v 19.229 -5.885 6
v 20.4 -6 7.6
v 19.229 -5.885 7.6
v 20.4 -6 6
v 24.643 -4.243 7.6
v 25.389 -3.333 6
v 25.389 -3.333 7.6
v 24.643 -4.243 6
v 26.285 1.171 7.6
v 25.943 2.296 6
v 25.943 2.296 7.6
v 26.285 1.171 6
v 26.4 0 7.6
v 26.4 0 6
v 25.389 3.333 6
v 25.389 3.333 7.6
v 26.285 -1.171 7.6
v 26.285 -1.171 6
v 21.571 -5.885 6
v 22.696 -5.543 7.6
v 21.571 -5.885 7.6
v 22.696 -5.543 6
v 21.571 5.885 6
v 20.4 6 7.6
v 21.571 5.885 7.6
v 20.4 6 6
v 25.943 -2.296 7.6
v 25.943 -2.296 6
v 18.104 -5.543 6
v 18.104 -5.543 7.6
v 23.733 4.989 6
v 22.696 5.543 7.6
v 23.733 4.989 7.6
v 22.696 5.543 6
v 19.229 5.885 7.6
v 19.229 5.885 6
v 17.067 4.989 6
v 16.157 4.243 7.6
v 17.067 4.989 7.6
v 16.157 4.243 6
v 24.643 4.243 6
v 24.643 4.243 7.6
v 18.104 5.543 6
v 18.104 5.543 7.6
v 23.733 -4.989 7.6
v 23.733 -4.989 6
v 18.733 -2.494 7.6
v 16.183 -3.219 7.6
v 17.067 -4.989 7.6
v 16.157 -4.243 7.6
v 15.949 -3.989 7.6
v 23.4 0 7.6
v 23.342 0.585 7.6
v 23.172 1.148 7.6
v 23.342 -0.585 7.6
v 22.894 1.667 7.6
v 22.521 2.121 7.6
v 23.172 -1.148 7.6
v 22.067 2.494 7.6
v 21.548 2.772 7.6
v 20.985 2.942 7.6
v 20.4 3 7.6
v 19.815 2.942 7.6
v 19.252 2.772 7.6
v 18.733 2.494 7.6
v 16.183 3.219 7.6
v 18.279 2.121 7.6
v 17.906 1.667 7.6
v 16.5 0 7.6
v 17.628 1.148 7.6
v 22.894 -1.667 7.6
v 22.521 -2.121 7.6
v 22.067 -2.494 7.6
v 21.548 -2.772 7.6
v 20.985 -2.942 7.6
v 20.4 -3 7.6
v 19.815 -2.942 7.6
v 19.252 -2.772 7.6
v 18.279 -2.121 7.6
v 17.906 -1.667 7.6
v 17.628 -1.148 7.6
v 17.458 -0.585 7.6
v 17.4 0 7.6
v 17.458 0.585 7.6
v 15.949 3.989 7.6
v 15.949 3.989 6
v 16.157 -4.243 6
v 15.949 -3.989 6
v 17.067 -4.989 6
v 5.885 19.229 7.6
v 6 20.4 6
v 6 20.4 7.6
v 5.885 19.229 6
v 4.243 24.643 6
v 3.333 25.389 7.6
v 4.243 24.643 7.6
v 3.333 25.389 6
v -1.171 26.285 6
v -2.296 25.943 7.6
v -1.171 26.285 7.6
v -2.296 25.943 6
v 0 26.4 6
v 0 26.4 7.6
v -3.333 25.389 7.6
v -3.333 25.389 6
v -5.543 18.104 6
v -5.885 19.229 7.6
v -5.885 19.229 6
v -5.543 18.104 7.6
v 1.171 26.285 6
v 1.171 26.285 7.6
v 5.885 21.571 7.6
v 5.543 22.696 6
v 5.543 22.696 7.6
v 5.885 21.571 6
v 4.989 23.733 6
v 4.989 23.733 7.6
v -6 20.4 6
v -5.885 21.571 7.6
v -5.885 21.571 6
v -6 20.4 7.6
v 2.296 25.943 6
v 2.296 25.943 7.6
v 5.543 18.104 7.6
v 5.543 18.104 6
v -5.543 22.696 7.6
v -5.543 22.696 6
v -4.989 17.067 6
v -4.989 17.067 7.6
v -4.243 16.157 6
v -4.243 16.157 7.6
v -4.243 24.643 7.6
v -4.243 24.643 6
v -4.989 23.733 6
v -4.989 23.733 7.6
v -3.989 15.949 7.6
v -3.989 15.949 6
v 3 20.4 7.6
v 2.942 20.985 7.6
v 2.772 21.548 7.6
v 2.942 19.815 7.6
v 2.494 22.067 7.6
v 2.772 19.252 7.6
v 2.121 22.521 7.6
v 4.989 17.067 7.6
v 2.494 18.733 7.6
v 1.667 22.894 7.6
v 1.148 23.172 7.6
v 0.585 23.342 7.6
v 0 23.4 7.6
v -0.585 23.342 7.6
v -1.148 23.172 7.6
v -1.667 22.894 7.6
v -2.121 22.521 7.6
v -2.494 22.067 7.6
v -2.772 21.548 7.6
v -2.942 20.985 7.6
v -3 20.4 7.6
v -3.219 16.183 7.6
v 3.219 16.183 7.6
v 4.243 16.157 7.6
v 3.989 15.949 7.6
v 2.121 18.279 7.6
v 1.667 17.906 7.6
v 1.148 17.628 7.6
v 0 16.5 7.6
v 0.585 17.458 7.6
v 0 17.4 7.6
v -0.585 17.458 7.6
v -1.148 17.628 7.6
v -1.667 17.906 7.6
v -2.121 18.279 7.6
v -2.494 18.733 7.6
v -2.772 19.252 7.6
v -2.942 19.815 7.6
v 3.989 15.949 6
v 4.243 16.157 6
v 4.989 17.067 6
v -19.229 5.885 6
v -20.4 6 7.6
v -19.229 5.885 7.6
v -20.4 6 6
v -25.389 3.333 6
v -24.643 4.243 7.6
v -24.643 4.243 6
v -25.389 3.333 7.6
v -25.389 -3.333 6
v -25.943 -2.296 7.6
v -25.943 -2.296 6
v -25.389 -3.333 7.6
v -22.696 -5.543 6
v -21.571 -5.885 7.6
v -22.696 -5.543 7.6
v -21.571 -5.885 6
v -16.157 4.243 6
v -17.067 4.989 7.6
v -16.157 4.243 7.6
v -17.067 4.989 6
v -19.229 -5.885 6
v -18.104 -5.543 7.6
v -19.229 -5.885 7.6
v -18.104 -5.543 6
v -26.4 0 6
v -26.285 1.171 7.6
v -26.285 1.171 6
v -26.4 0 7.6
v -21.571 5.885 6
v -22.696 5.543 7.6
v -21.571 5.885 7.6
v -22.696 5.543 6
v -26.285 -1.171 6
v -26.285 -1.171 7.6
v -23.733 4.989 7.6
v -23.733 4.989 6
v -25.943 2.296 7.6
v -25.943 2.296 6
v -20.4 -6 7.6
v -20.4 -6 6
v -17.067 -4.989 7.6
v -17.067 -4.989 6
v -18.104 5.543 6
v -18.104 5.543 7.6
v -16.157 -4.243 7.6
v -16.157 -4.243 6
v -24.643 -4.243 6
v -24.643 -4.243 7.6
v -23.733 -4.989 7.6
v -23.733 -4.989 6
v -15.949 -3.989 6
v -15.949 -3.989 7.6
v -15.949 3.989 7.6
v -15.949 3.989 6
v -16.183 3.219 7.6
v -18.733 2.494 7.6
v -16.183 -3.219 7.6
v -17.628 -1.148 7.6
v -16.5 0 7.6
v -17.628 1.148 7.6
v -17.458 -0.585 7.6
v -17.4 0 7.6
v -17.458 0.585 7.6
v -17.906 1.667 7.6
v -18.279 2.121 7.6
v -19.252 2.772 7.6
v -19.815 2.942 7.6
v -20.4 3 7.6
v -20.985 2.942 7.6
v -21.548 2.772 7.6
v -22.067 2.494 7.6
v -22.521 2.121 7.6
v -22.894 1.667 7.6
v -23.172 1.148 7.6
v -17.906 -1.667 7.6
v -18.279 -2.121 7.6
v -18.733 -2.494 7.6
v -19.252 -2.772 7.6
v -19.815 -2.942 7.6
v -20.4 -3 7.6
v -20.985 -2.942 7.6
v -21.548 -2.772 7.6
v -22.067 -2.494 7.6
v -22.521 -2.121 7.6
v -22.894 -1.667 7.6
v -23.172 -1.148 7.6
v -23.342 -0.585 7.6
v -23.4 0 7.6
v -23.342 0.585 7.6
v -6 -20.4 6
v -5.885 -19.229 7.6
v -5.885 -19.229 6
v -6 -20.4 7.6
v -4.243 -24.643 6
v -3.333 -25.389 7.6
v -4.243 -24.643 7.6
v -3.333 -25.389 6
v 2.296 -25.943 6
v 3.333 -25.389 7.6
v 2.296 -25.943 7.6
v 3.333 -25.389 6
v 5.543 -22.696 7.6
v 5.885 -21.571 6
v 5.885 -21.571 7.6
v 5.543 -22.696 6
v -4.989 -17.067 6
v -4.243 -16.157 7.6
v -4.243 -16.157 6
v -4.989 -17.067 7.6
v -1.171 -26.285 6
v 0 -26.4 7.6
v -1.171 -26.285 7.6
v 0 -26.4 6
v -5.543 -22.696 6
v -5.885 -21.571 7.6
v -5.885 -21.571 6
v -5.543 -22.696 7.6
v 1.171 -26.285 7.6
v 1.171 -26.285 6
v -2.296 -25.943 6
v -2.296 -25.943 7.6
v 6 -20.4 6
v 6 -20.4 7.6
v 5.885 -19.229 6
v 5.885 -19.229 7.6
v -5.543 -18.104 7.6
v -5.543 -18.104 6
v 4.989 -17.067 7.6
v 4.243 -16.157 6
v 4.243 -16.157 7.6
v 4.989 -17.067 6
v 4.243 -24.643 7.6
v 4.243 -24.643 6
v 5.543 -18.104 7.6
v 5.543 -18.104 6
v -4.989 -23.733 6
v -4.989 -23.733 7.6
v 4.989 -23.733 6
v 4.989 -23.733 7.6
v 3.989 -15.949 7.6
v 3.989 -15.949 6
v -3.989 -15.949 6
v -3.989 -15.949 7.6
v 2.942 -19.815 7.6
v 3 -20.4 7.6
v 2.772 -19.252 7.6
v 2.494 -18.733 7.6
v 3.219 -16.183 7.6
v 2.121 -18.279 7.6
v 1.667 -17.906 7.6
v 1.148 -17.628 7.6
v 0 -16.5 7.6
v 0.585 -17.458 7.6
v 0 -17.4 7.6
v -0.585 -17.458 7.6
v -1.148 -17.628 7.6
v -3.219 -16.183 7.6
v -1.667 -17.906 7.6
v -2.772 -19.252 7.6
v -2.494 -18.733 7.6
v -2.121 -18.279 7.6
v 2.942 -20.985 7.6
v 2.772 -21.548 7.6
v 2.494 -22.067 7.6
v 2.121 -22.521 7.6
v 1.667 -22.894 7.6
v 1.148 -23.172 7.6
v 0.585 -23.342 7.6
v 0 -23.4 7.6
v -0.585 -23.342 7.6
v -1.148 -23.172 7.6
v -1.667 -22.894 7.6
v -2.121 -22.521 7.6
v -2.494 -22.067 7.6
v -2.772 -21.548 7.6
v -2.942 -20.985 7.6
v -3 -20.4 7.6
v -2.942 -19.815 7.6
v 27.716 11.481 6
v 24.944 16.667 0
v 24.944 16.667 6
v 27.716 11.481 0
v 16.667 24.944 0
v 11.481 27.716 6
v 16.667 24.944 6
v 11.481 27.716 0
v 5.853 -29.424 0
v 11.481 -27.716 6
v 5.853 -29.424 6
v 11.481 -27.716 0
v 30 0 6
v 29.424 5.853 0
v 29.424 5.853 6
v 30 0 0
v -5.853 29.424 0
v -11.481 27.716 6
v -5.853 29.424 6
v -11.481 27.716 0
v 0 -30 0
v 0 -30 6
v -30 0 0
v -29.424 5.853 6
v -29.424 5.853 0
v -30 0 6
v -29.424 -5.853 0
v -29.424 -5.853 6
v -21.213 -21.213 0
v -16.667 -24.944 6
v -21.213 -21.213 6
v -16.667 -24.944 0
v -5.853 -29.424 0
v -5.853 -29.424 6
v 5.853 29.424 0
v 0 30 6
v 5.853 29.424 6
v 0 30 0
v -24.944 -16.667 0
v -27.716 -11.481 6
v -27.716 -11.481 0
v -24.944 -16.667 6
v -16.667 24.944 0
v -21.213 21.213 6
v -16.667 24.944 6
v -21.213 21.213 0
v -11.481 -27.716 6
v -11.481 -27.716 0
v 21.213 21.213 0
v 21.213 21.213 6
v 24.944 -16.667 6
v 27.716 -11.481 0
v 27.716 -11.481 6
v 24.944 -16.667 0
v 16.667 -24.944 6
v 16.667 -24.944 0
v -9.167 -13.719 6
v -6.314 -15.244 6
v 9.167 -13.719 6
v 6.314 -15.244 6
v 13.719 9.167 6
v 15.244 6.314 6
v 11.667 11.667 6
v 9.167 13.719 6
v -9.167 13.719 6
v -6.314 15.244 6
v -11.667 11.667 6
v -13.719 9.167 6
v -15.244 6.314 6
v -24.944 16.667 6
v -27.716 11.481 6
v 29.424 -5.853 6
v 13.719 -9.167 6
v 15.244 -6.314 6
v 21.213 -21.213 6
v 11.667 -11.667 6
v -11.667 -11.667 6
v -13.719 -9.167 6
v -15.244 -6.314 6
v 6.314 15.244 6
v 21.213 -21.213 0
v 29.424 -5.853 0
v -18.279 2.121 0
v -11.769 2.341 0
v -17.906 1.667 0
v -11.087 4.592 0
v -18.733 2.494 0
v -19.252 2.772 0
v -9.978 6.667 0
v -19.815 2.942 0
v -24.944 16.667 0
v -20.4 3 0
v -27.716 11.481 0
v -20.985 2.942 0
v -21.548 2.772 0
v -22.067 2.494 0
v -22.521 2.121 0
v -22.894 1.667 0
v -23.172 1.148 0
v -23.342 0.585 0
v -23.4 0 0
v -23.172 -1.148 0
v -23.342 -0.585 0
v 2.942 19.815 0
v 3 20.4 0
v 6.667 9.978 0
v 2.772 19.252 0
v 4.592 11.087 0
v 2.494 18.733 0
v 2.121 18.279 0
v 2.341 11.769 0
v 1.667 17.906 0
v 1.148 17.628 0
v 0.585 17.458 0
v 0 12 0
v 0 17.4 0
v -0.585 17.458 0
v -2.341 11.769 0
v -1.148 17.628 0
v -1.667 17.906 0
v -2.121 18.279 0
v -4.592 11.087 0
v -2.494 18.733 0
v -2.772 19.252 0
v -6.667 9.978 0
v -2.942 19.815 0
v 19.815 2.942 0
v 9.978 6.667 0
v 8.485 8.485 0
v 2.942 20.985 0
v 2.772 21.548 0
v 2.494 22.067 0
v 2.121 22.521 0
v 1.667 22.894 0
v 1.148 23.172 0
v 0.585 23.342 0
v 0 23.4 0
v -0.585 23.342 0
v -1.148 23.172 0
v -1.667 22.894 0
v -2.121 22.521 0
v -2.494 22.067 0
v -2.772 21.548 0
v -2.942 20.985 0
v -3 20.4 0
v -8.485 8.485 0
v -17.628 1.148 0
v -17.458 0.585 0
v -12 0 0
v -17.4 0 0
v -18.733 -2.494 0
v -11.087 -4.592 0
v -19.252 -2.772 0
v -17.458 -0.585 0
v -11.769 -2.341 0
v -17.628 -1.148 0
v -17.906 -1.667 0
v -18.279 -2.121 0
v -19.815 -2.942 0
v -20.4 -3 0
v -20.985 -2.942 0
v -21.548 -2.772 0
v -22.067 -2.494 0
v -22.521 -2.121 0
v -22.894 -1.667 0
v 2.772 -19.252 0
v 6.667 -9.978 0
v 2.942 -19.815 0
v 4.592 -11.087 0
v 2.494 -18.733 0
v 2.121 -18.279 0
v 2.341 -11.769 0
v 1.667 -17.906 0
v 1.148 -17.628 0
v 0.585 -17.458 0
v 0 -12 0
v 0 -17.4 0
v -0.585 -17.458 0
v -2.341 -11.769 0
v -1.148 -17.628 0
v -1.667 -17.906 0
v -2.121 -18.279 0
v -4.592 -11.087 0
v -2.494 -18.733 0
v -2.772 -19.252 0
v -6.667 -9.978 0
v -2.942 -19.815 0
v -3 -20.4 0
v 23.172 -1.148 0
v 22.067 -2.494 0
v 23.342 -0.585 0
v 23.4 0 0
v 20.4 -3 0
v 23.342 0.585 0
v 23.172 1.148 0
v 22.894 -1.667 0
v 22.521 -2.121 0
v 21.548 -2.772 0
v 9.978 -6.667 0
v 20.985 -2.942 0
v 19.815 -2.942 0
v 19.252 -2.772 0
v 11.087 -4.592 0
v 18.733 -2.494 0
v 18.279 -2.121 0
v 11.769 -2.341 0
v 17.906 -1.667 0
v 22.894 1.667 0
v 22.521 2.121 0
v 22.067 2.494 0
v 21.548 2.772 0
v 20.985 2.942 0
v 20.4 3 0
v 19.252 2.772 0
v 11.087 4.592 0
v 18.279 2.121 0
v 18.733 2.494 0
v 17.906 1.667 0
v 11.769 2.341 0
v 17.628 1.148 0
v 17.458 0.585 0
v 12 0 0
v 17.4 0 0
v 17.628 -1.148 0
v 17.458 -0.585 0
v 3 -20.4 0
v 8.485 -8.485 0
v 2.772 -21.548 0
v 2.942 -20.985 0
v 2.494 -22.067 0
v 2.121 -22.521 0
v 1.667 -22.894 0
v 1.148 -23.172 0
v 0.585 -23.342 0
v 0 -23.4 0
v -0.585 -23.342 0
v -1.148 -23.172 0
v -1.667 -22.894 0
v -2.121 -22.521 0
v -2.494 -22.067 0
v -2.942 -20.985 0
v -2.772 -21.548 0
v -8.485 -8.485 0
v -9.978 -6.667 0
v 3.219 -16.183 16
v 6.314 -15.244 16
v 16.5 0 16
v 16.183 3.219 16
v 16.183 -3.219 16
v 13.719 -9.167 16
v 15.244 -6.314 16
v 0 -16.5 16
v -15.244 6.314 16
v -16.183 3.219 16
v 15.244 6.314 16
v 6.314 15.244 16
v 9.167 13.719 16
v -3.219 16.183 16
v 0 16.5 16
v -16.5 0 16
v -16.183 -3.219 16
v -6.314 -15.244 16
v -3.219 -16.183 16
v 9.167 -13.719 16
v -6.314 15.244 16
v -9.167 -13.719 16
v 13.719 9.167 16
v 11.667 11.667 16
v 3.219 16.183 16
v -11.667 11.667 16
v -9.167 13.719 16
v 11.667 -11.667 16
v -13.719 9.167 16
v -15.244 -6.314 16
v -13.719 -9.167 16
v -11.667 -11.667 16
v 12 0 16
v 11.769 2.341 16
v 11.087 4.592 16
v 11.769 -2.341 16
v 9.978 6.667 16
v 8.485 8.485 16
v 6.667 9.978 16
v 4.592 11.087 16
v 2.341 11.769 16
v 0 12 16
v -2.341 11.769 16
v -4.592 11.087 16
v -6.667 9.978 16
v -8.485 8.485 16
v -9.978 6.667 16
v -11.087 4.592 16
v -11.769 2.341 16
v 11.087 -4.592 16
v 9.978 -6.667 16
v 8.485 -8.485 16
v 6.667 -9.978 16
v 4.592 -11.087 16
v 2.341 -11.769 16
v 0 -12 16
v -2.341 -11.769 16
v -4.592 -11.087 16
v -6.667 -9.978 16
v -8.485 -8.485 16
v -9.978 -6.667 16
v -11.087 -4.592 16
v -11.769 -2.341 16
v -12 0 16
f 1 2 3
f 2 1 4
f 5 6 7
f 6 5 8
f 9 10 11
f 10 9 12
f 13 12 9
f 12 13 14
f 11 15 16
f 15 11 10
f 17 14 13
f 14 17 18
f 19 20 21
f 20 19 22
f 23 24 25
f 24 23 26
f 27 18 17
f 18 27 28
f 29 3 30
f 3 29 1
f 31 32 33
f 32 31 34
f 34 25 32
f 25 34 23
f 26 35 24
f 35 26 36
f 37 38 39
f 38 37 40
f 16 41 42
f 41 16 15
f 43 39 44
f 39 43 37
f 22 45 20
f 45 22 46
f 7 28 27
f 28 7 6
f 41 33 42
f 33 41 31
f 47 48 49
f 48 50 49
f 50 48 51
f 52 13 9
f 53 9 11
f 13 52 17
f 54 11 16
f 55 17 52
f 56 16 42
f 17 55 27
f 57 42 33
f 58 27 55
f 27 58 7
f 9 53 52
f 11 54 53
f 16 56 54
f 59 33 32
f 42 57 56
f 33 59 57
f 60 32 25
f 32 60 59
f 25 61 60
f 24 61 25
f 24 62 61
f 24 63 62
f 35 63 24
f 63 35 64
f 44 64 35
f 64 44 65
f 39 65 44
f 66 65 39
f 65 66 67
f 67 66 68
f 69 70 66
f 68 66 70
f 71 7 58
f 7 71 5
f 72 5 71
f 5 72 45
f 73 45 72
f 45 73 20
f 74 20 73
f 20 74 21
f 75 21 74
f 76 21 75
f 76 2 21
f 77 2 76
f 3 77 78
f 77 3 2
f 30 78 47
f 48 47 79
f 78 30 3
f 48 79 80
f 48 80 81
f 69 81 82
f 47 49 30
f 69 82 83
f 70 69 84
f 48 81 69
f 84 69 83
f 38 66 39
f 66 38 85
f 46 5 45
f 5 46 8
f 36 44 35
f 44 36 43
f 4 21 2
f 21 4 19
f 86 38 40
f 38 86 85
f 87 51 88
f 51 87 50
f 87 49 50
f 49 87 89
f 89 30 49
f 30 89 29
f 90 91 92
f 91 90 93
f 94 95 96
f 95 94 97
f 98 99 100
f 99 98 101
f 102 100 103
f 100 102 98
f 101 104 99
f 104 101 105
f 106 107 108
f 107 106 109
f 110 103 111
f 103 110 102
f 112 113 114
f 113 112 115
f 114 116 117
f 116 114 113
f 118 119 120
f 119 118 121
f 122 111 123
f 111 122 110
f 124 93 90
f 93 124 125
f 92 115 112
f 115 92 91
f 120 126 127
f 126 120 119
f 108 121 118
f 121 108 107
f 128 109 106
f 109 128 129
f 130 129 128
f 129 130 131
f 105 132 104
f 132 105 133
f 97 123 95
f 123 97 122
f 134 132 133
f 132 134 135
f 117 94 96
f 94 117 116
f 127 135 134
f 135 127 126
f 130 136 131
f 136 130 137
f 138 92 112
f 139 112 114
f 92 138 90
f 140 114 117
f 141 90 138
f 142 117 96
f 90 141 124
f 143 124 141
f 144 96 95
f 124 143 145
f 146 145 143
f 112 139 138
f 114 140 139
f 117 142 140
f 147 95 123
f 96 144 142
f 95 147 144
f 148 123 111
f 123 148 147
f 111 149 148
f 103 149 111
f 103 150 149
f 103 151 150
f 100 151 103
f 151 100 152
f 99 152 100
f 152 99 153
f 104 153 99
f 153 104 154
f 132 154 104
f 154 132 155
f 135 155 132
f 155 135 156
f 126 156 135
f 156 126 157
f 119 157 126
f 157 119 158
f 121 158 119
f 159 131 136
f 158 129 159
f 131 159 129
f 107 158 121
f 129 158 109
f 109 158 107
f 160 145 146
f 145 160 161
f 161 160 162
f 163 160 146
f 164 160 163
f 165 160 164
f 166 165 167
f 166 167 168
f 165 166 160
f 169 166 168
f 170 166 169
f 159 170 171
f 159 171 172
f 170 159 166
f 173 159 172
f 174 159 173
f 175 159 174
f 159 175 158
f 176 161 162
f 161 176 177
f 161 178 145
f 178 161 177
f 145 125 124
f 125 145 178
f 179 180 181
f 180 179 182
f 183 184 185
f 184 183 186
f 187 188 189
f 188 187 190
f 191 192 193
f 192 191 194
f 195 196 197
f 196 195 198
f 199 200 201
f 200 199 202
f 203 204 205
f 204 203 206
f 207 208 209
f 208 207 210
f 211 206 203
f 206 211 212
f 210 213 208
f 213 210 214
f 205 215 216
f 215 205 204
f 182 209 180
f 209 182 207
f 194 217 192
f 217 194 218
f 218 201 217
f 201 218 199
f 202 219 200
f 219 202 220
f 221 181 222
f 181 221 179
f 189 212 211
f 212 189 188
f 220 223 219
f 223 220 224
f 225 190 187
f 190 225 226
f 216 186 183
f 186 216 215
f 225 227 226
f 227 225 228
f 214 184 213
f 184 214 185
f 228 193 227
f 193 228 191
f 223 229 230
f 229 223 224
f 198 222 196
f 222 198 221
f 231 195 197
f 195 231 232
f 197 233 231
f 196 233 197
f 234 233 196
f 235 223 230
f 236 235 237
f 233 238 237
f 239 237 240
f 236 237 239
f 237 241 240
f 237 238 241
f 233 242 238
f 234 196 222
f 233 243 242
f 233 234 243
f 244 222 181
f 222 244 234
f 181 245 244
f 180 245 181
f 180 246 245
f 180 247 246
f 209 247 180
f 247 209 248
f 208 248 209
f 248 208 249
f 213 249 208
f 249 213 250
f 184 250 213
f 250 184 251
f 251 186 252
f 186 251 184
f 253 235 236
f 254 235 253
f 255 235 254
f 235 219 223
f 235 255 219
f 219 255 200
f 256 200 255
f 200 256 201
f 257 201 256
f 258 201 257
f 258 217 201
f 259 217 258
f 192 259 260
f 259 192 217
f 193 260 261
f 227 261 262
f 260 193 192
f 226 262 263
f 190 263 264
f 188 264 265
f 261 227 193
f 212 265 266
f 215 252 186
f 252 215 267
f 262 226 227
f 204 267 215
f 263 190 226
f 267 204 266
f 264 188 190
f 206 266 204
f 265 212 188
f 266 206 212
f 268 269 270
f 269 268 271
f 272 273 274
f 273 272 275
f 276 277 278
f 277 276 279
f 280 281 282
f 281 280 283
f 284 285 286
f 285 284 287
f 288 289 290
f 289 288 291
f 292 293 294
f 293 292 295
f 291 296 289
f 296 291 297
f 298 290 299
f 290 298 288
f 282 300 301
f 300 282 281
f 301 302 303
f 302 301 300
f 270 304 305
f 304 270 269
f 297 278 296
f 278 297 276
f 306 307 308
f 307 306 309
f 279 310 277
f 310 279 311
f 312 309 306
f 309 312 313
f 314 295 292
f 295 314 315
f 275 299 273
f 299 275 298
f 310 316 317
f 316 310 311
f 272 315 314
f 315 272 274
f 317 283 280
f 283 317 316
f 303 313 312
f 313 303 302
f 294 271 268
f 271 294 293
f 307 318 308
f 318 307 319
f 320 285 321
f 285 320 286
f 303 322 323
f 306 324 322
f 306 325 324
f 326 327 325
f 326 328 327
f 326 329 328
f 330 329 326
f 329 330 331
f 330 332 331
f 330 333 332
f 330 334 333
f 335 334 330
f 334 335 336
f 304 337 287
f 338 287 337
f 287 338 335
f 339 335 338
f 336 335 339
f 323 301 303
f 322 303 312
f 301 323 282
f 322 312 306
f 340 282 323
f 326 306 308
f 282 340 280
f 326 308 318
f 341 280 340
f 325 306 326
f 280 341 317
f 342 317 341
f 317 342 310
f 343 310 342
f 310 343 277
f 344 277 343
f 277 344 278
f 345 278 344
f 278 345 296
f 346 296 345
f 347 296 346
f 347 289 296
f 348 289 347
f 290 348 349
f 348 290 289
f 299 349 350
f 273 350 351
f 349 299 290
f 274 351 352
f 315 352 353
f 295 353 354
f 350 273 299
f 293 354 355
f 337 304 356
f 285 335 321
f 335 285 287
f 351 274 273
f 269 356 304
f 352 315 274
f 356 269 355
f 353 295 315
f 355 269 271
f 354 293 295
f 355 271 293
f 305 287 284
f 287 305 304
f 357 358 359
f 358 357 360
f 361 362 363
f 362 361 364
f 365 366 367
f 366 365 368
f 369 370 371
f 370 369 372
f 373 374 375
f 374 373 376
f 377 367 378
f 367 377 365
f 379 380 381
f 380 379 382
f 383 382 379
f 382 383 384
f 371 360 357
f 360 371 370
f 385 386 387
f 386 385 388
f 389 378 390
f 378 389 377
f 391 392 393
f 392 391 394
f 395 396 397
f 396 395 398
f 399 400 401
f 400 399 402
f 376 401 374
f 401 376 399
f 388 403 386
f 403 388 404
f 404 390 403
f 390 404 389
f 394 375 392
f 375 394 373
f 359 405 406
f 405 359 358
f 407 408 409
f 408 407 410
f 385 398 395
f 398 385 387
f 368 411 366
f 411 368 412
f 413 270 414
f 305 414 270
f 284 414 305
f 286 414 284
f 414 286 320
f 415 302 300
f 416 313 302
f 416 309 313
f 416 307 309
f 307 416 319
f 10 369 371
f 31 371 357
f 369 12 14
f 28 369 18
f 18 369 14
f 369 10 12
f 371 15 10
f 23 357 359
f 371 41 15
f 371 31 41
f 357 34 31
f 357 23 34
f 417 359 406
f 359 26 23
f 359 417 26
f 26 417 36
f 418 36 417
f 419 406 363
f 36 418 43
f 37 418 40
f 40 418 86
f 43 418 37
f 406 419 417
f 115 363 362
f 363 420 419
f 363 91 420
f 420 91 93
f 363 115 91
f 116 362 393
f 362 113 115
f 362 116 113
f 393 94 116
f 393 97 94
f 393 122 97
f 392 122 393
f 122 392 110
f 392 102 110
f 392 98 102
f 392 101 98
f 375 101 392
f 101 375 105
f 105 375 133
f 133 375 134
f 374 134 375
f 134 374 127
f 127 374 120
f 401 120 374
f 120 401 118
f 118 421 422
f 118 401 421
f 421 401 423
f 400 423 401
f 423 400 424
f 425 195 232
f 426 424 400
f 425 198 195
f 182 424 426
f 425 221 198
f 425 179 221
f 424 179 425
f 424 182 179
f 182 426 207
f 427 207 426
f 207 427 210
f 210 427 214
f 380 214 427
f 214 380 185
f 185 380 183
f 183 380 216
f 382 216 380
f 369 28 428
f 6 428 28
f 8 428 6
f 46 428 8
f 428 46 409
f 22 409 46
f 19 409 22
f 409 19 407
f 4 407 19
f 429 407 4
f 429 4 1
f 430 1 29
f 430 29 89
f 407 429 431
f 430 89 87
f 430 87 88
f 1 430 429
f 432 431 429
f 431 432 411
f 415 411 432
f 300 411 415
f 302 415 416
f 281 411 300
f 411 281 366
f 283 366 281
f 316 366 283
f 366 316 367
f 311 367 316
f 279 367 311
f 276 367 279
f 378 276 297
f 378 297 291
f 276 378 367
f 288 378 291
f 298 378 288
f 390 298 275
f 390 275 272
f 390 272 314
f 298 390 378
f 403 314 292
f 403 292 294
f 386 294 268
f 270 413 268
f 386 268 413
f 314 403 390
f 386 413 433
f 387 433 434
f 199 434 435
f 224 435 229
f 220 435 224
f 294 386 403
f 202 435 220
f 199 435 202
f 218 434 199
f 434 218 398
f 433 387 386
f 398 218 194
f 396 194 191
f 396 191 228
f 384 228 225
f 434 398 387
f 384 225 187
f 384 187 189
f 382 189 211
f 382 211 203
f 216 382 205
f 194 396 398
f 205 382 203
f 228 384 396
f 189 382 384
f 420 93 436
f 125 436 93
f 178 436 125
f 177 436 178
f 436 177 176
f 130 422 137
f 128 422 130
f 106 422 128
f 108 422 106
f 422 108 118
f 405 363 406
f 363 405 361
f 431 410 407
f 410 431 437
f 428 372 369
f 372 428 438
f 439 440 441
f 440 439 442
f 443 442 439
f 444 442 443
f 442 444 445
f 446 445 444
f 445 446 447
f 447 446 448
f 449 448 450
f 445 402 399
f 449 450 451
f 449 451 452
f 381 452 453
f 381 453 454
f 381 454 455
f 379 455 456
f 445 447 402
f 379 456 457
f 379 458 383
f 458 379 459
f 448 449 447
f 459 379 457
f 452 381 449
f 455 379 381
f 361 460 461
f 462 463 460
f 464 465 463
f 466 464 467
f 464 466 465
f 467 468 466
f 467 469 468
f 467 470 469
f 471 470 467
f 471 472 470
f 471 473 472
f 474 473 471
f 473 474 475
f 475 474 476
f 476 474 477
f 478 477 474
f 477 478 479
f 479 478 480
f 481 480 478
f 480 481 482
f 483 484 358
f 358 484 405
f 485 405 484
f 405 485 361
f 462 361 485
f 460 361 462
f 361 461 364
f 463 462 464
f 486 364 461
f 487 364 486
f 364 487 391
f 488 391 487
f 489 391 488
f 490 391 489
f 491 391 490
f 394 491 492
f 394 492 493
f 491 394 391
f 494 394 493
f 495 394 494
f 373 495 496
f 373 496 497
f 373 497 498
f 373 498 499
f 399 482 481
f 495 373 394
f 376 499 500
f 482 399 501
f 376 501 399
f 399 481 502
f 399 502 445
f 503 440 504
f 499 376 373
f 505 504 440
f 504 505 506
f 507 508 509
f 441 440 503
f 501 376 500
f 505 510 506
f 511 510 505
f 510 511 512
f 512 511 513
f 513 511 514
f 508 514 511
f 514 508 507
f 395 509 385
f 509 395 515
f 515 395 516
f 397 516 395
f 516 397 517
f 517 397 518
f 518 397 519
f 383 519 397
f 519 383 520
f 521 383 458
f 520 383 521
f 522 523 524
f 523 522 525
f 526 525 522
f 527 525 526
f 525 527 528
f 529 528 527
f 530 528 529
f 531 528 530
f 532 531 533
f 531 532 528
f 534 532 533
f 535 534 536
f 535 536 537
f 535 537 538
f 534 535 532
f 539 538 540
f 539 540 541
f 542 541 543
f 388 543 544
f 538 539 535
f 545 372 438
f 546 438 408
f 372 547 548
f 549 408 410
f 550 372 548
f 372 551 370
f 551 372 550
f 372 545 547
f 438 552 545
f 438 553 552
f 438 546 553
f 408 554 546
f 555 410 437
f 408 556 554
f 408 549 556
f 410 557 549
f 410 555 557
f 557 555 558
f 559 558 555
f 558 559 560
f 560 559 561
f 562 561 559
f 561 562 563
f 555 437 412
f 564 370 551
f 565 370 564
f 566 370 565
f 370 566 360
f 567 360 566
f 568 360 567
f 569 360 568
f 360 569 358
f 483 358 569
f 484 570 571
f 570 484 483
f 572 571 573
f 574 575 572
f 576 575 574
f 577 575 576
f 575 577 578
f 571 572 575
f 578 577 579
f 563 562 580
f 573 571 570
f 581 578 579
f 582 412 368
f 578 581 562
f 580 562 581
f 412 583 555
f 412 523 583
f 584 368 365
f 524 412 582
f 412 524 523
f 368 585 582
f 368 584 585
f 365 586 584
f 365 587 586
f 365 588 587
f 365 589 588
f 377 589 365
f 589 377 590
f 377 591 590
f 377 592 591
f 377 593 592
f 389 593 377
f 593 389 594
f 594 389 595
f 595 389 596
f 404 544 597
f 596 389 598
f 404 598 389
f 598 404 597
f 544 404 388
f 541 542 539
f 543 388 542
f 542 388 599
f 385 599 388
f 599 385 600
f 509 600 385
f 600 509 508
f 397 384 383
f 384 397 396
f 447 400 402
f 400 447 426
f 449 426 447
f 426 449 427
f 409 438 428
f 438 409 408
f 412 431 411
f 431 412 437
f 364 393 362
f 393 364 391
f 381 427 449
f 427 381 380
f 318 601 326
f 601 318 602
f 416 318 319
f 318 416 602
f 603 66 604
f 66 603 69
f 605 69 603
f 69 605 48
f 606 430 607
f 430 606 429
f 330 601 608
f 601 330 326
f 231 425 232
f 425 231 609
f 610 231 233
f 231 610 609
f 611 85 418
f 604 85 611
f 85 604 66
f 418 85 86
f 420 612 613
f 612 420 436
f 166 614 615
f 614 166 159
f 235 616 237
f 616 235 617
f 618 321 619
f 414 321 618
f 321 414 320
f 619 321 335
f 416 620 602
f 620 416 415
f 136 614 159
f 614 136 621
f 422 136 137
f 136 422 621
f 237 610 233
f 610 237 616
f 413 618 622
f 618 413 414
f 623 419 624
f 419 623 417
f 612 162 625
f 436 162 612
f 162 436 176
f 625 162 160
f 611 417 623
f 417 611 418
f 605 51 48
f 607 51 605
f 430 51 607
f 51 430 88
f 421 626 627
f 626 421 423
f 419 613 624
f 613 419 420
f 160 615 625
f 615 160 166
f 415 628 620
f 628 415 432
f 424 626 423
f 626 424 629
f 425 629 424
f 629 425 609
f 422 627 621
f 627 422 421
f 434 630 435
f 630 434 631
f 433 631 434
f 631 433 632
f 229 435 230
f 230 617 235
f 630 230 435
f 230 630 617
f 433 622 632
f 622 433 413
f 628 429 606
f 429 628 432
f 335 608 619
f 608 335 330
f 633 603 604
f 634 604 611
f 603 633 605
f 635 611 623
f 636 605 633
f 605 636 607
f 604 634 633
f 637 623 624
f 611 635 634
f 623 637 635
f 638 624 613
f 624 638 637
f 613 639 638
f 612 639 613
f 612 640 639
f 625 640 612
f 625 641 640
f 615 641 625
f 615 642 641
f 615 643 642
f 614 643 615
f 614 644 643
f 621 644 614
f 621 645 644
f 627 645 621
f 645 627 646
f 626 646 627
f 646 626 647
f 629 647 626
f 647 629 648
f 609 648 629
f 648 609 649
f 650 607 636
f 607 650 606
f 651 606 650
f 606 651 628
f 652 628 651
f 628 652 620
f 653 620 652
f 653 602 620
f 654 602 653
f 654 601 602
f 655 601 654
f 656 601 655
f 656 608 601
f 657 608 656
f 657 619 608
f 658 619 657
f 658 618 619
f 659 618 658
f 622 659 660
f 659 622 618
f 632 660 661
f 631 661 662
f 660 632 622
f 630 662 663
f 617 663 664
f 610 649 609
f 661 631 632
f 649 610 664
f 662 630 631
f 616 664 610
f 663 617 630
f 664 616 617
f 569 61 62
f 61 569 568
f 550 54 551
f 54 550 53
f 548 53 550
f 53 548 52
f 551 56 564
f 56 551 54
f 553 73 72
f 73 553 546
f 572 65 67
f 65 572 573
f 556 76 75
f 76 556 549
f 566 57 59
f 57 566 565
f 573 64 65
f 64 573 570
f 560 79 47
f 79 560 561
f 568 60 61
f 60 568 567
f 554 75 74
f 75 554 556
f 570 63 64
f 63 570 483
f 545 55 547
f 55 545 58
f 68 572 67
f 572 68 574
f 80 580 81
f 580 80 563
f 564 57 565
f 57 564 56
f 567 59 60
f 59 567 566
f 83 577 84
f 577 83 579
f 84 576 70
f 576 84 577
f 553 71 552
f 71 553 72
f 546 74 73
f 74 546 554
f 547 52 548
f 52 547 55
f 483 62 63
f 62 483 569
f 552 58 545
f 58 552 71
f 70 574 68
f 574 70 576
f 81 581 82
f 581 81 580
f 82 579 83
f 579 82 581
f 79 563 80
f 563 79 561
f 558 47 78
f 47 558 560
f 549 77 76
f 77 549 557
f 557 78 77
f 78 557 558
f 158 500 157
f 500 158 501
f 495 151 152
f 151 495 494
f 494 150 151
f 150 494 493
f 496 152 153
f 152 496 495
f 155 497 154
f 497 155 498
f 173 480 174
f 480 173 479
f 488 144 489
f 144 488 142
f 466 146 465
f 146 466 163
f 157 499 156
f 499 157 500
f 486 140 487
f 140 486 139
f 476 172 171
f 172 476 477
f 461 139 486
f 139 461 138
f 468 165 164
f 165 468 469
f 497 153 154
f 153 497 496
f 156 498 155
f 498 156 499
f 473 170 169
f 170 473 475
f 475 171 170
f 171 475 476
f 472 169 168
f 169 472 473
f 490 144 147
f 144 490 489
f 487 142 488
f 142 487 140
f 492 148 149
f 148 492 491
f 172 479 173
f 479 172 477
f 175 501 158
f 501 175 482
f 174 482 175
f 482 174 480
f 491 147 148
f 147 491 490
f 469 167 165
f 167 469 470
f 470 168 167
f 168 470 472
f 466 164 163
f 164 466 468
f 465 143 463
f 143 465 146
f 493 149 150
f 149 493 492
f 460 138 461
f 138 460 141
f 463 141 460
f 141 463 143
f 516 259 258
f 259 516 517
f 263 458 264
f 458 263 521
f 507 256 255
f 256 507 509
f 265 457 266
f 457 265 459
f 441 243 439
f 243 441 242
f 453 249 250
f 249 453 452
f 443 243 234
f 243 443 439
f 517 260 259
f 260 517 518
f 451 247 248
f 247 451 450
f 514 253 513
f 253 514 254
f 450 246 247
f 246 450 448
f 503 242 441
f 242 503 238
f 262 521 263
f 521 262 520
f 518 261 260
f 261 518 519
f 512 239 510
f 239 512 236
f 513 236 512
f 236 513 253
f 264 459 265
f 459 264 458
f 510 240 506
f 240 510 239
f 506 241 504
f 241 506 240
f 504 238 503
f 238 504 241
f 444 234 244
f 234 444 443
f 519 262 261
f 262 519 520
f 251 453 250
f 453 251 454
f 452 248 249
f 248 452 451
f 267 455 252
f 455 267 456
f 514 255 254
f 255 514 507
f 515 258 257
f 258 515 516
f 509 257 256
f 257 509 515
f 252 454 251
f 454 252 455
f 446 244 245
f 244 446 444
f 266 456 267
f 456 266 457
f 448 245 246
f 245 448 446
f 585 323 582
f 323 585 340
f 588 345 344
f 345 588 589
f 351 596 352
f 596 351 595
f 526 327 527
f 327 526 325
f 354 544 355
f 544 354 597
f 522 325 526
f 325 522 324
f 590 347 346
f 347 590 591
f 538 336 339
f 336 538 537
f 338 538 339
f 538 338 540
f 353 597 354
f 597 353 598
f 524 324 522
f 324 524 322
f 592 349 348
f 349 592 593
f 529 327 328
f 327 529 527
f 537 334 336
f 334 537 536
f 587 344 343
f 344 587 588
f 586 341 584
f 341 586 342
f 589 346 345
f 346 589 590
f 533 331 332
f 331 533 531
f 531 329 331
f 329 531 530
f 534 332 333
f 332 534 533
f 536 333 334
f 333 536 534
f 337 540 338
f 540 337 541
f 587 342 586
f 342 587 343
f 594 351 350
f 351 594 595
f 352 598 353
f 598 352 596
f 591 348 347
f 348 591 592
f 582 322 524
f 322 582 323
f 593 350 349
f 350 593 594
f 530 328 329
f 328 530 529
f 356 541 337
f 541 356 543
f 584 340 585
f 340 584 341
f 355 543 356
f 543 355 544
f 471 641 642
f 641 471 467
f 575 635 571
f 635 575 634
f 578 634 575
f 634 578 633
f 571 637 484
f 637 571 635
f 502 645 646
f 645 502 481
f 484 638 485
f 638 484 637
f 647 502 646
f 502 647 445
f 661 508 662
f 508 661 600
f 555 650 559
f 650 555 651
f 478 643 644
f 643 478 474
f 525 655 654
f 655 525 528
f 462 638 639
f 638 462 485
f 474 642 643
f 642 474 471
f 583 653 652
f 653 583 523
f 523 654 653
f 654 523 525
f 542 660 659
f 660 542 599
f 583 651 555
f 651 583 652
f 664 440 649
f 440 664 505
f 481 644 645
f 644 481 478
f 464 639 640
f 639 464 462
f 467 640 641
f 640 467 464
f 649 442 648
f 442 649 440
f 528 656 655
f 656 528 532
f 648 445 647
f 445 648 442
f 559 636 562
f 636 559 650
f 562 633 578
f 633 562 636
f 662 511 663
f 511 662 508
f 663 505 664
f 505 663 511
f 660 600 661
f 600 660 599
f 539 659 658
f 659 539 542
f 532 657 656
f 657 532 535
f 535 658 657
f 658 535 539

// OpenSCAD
$fn = 32;

// ----------------------------------------------------------------------
// Bolt-circle flange: 60 mm outside, 4 bolt holes, bore 24 mm
// ----------------------------------------------------------------------

// --- parameters (mm) ---
flange_d = 60;            // flange outside diameter
flange_t = 6;             // flange thickness
bolts = 4;                // number of bolt holes
bolt_d = 6;               // bolt clearance
bolt_r = 20.4;            // bolt circle radius
bore_d = 24;              // centre bore
hub_d = 33;               // raised hub diameter
hub_h = 10;               // raised hub height
spot_d = 12;              // spot faced bosses
spot_h = 1.6;             // spot face height

module body() {
  cylinder(h = flange_t, d = flange_d);
  /* raised hub, sunk 1 mm into the flange */
  translate([0, 0, flange_t - 1]) cylinder(h = hub_h + 1, d = hub_d);
  /* spot faced pads under the bolt heads */
  for (i = [0 : bolts - 1]) rotate([0, 0, i * 360 / bolts]) translate([bolt_r, 0, flange_t - 1]) cylinder(h = spot_h + 1, d = spot_d);
}

difference() {
  body();
  /* bolt circle */
  for (i = [0 : bolts - 1]) rotate([0, 0, i * 360 / bolts]) translate([bolt_r, 0, -1]) cylinder(h = flange_t + hub_h + 3, d = bolt_d);
  translate([0, 0, -1]) cylinder(h = flange_t + hub_h + 3, d = bore_d);
}
